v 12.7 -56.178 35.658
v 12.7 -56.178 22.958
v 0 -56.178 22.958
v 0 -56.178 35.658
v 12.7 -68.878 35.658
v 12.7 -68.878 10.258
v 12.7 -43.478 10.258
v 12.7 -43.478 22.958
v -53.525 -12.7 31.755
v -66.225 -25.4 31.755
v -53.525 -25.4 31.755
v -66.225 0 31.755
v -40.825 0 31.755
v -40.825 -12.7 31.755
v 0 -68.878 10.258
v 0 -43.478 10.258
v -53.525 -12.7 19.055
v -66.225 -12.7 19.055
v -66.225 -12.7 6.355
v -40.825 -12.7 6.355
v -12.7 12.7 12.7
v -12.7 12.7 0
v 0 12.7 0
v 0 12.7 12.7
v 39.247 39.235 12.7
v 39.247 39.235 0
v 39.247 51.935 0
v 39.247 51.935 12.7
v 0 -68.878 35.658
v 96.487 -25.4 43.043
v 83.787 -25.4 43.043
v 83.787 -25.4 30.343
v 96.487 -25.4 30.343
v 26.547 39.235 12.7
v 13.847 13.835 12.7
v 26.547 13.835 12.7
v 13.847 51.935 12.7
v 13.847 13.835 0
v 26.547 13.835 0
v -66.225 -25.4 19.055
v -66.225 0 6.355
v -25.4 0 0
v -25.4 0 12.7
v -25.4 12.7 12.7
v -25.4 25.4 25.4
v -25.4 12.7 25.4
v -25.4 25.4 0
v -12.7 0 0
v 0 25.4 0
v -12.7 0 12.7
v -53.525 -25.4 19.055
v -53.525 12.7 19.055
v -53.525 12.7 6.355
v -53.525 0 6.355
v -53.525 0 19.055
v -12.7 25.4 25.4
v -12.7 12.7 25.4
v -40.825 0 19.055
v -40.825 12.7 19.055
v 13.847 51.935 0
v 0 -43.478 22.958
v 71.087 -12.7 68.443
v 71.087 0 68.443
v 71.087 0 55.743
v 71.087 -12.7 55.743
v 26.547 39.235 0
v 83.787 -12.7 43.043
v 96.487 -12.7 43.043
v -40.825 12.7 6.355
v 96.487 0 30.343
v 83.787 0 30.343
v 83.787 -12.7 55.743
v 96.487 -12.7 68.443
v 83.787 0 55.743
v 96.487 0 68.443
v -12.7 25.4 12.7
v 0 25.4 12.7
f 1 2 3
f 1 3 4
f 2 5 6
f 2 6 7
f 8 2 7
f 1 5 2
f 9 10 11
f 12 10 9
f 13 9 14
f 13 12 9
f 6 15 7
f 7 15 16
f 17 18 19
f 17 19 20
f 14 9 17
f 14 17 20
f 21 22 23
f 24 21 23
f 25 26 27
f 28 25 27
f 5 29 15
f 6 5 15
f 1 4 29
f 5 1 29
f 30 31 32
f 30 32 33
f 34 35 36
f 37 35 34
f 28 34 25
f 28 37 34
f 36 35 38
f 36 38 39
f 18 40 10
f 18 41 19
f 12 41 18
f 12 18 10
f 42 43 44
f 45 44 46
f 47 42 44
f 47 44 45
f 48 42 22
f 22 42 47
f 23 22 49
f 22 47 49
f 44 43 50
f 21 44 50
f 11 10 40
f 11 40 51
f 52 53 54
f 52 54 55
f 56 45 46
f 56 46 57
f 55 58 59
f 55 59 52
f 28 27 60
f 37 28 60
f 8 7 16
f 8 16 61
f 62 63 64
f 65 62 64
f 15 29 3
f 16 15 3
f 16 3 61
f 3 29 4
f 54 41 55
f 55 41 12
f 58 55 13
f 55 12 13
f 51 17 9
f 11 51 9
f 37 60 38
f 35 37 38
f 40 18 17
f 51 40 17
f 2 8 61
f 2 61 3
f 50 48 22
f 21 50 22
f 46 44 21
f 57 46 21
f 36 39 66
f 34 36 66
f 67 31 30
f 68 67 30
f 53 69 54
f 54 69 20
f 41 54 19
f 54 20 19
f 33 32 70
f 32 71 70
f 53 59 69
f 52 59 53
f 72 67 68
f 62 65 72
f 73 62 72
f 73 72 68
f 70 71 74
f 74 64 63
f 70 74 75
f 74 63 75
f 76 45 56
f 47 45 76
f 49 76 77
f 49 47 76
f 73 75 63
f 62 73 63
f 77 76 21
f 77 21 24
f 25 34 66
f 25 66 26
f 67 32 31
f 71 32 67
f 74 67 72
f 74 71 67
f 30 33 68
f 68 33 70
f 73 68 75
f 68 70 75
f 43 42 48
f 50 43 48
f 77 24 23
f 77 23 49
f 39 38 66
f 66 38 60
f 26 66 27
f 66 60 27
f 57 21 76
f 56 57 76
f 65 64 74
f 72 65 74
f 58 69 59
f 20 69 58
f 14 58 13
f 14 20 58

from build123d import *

# Parameters (mm, degrees)
F1_DEPTH  = 12.7
F2_W      = 12.7
F2_H      = 12.7
F3_DEPTH  = 12.7
F5_DEPTH  = 12.7
F6_W      = 12.7
F6_H      = 12.7
F7_DEPTH  = 12.7
F8_W      = 25.4
F8_H      = 25.4
F9_DEPTH  = 12.7
F10_W     = 12.7
F10_H     = 12.7
F11_DEPTH = 12.7
F12_W     = 12.7
F12_H     = 12.7
F13_DEPTH = 12.7
F15_DEPTH = 12.7
F17_DEPTH = 12.7


with BuildPart() as f1:
    # F0 (on Top) → F1 (new body)
    with BuildSketch(Plane.XY):
        Polygon((-25.4, 25.4), (-25.4, 0), (-12.7, 0), (-12.7, 12.7), (0, 12.7), (0, 25.4), align=None)
    extrude(amount=F1_DEPTH)

    # F2 (on face) → F3 (join)
    with BuildSketch(Plane.XY.offset(12.7)):
        with Locations((-19.05, 19.05)):
            Rectangle(F2_W, F2_H)
    extrude(amount=F3_DEPTH)


with BuildPart() as f5:
    # F4 (on Front) → F5 (new body)
    with BuildSketch(Plane.XZ):
        Polygon((96.486876, 68.442659), (83.786876, 68.442659), (71.086876, 68.442659), (71.086876, 55.742659), (83.786876, 55.742659), (83.786876, 30.342659), (96.486876, 30.342659), align=None)
    extrude(amount=F5_DEPTH)

    # F6 (on face) → F7 (join)
    with BuildSketch(Plane.XZ.offset(12.7)):
        with Locations((90.136876, 36.692659)):
            Rectangle(F6_W, F6_H)
    extrude(amount=F7_DEPTH)


with BuildPart() as f9:
    # F8 (on Front) → F9 (new body)
    with BuildSketch(Plane.XZ):
        with Locations((-53.525445, 19.055466)):
            Rectangle(F8_W, F8_H)
    extrude(amount=F9_DEPTH)

    # F10 (on face) → F11 (join)
    with BuildSketch(Plane.XZ.offset(12.7)):
        with Locations((-59.875445, 25.405466)):
            Rectangle(F10_W, F10_H)
    extrude(amount=F11_DEPTH)

    # F12 (on face) → F13 (join)
    with BuildSketch(Plane(origin=(0, 0, 0), x_dir=(-1, 0, 0), z_dir=(0, 1, 0))):
        with Locations((47.175445, 12.705466)):
            Rectangle(F12_W, F12_H)
    extrude(amount=F13_DEPTH)


with BuildPart() as f15:
    # F14 (on Top) → F15 (new body)
    with BuildSketch(Plane.XY):
        Polygon((13.846967, 51.935214), (13.846967, 13.835214), (26.546967, 13.835214), (26.546967, 39.235214), (39.246967, 39.235214), (39.246967, 51.935214), align=None)
    extrude(amount=F15_DEPTH)


with BuildPart() as f17:
    # F16 (on Right) → F17 (new body)
    with BuildSketch(Plane.YZ):
        Polygon((-56.177915, 35.658392), (-68.877915, 35.658392), (-68.877915, 10.258392), (-43.477915, 10.258392), (-43.477915, 22.958392), (-56.177915, 22.958392), align=None)
    extrude(amount=F17_DEPTH)


solid = Compound([f1.part, f5.part, f9.part, f15.part, f17.part])
